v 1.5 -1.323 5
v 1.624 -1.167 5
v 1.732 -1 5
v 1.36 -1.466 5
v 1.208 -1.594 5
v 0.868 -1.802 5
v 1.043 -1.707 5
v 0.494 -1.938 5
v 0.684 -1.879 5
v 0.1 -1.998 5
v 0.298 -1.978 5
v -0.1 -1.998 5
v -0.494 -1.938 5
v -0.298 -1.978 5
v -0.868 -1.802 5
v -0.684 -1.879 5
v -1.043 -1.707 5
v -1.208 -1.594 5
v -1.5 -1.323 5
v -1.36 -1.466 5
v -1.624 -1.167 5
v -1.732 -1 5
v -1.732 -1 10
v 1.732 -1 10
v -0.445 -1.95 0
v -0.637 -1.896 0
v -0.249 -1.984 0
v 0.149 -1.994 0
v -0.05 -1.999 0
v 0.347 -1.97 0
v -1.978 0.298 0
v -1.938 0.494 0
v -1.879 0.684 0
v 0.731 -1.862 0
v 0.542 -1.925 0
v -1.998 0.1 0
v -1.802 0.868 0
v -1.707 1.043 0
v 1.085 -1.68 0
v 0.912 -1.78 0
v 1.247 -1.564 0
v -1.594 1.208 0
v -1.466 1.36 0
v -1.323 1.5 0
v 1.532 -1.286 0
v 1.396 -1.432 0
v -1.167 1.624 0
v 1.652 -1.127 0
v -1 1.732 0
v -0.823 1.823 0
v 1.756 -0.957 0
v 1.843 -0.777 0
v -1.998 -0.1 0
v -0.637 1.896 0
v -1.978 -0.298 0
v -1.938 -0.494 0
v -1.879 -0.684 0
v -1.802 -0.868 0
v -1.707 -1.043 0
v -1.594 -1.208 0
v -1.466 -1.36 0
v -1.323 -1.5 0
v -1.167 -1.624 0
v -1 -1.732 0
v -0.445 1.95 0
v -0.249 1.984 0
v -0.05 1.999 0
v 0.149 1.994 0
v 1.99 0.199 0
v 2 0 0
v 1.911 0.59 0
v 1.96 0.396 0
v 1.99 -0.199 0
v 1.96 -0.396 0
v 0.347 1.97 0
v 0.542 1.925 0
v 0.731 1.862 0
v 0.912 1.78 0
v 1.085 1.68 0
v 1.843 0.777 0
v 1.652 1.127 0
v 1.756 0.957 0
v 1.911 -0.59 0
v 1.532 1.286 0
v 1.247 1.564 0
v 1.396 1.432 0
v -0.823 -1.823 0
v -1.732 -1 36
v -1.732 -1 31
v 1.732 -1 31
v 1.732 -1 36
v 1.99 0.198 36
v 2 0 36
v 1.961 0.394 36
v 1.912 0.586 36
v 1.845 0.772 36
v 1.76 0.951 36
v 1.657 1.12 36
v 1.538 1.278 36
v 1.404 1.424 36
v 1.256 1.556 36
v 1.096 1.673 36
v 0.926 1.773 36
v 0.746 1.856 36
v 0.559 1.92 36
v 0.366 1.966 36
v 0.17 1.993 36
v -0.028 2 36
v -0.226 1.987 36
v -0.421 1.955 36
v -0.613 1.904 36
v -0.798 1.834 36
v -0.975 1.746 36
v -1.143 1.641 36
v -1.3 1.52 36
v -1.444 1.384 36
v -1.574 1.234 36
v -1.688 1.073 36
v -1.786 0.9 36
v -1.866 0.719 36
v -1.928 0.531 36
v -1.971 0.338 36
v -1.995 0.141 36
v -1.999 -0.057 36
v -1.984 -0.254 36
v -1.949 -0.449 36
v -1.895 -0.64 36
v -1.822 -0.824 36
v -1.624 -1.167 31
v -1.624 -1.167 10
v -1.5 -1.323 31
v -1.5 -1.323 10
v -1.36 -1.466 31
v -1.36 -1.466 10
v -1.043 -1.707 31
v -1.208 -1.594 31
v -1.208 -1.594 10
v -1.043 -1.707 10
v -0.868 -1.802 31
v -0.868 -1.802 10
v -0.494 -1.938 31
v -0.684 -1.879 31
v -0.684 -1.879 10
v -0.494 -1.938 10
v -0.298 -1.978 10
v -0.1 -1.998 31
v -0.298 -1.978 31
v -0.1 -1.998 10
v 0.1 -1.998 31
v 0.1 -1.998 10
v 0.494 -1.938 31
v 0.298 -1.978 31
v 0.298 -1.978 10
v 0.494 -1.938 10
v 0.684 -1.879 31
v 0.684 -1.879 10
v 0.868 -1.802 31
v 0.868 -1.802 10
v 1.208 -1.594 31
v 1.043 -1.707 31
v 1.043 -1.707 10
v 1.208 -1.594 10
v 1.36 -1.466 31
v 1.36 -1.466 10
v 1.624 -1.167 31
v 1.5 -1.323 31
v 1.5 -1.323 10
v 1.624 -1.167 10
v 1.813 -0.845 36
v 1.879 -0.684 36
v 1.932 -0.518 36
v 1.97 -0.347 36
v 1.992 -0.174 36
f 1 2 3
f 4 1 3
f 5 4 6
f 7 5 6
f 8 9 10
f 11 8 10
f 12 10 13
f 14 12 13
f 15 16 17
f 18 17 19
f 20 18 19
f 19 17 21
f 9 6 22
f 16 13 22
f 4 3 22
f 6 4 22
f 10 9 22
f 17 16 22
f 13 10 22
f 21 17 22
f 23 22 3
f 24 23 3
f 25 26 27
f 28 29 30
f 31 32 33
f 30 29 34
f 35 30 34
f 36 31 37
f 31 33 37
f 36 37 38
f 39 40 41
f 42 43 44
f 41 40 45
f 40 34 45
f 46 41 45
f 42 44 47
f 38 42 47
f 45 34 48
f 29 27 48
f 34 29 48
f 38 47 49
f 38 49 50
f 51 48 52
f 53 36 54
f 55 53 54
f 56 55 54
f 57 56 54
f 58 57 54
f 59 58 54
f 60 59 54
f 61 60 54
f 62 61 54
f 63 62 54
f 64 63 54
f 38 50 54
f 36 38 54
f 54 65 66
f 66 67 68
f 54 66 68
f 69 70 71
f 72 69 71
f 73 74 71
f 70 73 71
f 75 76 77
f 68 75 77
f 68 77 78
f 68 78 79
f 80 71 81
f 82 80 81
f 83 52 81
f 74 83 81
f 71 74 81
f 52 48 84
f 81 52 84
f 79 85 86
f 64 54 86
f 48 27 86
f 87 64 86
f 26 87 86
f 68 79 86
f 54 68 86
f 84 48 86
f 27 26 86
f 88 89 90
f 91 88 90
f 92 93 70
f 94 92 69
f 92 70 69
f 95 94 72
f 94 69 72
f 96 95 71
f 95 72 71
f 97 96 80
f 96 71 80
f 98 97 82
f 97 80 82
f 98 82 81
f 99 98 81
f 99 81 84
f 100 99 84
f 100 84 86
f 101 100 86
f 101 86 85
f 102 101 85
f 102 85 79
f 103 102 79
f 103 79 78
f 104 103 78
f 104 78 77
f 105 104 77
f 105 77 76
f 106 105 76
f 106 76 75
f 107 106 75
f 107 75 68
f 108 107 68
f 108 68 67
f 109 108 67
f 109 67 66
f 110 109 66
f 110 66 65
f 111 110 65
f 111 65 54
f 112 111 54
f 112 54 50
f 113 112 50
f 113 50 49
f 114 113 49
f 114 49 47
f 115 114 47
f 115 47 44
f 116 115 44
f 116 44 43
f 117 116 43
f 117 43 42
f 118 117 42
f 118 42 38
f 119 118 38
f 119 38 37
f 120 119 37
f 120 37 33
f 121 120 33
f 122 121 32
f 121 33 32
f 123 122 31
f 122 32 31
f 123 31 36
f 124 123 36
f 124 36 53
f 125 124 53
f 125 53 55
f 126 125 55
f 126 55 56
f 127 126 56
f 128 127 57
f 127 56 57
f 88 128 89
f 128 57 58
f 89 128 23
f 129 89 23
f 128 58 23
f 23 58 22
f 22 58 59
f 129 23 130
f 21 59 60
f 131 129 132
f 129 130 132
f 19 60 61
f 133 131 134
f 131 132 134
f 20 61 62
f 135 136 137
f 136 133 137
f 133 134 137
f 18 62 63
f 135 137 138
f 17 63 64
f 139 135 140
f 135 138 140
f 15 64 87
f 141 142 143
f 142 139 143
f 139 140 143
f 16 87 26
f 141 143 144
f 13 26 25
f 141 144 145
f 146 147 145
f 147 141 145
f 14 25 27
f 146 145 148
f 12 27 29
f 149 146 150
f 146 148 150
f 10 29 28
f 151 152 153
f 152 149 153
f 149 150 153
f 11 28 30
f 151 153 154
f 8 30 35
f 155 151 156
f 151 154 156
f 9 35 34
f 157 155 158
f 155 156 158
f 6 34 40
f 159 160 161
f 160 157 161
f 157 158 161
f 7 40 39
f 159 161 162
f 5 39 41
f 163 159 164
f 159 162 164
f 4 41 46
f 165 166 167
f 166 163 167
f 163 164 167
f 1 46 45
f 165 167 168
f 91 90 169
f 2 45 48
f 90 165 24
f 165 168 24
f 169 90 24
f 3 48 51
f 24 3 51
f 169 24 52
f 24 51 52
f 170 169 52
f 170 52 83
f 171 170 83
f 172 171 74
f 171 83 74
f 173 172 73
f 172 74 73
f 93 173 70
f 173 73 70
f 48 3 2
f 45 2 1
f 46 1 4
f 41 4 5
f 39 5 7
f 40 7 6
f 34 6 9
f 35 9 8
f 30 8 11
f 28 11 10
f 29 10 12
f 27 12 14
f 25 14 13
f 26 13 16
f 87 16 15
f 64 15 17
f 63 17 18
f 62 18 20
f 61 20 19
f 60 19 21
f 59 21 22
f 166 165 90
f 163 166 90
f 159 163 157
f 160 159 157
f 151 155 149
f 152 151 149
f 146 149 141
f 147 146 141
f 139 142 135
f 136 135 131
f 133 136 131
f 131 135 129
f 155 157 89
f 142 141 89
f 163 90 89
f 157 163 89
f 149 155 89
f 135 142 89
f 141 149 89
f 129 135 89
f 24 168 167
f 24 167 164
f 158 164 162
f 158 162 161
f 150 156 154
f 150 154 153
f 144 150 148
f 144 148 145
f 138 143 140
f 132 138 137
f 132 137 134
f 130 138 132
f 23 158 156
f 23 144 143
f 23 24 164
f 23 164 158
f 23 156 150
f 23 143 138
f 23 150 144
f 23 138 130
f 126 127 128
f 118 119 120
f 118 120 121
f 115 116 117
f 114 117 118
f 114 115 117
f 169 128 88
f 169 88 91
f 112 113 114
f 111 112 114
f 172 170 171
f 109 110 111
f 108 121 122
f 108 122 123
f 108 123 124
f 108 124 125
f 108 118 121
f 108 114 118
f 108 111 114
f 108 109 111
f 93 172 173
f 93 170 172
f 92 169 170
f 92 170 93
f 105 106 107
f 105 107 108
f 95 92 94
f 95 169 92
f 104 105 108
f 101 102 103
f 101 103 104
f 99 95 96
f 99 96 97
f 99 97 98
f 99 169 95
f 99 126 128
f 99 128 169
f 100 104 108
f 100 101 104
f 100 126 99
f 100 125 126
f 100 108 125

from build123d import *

# Parameters (mm, degrees)
SKETCH1_R           = 2
BOSS_EXTRUDE1_DEPTH = 36
CUT_EXTRUDE1_START  = -5
CUT_EXTRUDE1_DEPTH  = 5
CUT_EXTRUDE2_DEPTH  = 5


with BuildPart() as part:
    # Sketch1 → Boss-Extrude1 (new body)
    with BuildSketch(Plane.XY):
        Circle(SKETCH1_R)
    extrude(amount=BOSS_EXTRUDE1_DEPTH)

    # Sketch2 → Cut-Extrude1 (cut)
    with BuildSketch(Plane.XY.offset(36).offset(CUT_EXTRUDE1_START)):
        with BuildLine():
            Line((-1.732050808, -1), (1.732050808, -1))
            ThreePointArc((1.732050808, -1), (0, -2), (-1.732050808, -1))
        make_face()
    extrude(amount=CUT_EXTRUDE1_DEPTH, mode=Mode.SUBTRACT)

    # Sketch3 → Cut-Extrude2 (cut)
    with BuildSketch(Plane(origin=(0, 0, 5), x_dir=(-1, 0, 0), z_dir=(0, 0, -1))):
        with BuildLine():
            Line((1.732050808, -1), (-1.732050808, -1))
            ThreePointArc((-1.732050808, -1), (0, -2), (1.732050808, -1))
        make_face()
    extrude(amount=-CUT_EXTRUDE2_DEPTH, mode=Mode.SUBTRACT)


solid = part.part
